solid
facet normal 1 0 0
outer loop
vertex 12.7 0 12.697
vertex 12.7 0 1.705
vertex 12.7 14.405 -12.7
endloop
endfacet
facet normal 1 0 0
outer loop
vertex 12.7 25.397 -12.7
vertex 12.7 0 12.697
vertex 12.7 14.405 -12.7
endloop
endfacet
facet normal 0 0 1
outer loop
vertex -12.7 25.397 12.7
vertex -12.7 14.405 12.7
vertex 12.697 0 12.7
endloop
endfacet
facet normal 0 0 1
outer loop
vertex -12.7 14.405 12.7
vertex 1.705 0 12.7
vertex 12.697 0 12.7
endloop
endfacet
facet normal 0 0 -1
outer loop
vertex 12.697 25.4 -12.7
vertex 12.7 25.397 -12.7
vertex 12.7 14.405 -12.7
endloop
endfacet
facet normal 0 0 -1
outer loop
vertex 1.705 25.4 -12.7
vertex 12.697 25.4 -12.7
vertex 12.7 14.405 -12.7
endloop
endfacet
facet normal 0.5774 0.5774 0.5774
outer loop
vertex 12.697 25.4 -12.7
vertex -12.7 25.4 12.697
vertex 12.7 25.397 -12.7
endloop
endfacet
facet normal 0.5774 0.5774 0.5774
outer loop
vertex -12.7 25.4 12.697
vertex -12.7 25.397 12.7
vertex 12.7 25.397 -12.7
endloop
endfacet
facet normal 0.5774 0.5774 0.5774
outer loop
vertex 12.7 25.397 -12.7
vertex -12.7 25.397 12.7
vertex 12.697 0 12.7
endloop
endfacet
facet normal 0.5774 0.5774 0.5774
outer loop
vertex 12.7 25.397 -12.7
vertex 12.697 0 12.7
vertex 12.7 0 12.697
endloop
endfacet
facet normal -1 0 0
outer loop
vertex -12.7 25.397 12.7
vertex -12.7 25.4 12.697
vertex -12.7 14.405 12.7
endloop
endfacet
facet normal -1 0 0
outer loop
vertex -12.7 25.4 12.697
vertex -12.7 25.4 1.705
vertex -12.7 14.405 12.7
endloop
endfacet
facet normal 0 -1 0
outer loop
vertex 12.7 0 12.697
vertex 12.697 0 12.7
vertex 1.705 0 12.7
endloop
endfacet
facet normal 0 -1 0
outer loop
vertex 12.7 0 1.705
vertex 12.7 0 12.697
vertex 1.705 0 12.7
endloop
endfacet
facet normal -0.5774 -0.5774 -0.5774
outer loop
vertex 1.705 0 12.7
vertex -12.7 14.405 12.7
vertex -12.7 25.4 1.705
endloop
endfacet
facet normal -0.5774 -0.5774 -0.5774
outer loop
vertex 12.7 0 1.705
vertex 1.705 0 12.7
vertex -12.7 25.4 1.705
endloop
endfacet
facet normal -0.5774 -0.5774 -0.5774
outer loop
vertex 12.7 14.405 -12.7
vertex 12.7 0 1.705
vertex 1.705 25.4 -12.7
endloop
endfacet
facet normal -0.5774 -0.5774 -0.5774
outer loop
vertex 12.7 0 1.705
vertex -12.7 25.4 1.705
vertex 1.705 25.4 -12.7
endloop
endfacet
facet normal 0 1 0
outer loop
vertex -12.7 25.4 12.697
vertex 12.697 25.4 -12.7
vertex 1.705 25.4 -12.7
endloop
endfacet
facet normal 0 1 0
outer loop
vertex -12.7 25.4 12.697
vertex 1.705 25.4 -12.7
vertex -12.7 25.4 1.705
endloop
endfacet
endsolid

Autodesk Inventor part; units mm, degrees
ref_plane "YZ Plane" through (0, 0, 0) normal (1, 0, 0) x (0, 1, 0)
sketch "Sketch1" plane through (0, 0, 0) normal (0, 1, 0) x (-1, 0, 0)
  line L0 (12.7, 12.7) -> (-12.7, 12.7)
  line L1 (-12.7, 12.7) -> (-12.7, -12.7)
  line L2 (-12.7, -12.7) -> (12.7, -12.7)
  line L3 (12.7, -12.7) -> (12.7, 12.7)
  point P0 (0, 0)
  dimension "d0" = 12.7
  dimension "d1" = 25.4
  dimension "d2" = 25.4
  dimension "d3" = 12.7
extrude "Extrusion1" add sketch "Sketch1" along normal blind 25.4
ref_plane "Work Plane1" through (-12.7, 25.4, 12.7) normal (-0.5774, -0.5774, -0.5774) x (0.7071, 0, -0.7071)
sketch "Sketch2" plane through (-12.7, 25.4, 12.7) normal (-0.5774, -0.5774, -0.5774) x (0.7071, 0, -0.7071)
  line L0 (-1.8052, -5.2104) -> (39.1986, -5.2104)
  line L1 (39.1986, -5.2104) -> (39.1986, 33.6585)
  line L2 (39.1986, 33.6585) -> (-1.8052, 33.6585)
  line L3 (-1.8052, 33.6585) -> (-1.8052, -5.2104)
  point P0 (17.9605, 20.739)
extrude "Extrusion2" cut sketch "Sketch2" against normal blind 25.4
ref_plane "Work Plane2" through (12.7, 0, -12.7) normal (-0.5774, -0.5774, -0.5774) x (-0.7071, 0, 0.7071)
sketch "Sketch3" plane through (12.7, 0, -12.7) normal (-0.5774, -0.5774, -0.5774) x (-0.7071, 0, 0.7071)
  line L0 (-4.9386, 41.2898) -> (46.8411, 41.2898)
  line L1 (46.8411, 41.2898) -> (46.8411, -12.9896)
  line L2 (46.8411, -12.9896) -> (-4.9386, -12.9896)
  line L3 (-4.9386, -12.9896) -> (-4.9386, 41.2898)
  point P0 (17.9605, 0)
extrude "Extrusion3" cut sketch "Sketch3" along normal blind 25.4
ref_plane "Work Plane3" through (-16.3662, 21.7338, 9.0338) normal (0.5774, 0.5774, 0.5774) x (0.7071, 0, -0.7071)
sketch "Sketch4" plane through (-16.3662, 21.7338, 9.0338) normal (0.5774, 0.5774, 0.5774) x (0.7071, 0, -0.7071)
  line L0 (44.1276, 17.5061) -> (-11.0494, 17.5061)
  line L1 (-11.0494, 17.5061) -> (-11.0494, -38.1771)
  line L2 (-11.0494, -38.1771) -> (44.1276, -38.1771)
  line L3 (44.1276, -38.1771) -> (44.1276, 17.5061)
  point P0 (17.9605, -20.739)
extrude "Extrusion4" cut sketch "Sketch4" against normal blind 25.4
properties part number "jimscube"
